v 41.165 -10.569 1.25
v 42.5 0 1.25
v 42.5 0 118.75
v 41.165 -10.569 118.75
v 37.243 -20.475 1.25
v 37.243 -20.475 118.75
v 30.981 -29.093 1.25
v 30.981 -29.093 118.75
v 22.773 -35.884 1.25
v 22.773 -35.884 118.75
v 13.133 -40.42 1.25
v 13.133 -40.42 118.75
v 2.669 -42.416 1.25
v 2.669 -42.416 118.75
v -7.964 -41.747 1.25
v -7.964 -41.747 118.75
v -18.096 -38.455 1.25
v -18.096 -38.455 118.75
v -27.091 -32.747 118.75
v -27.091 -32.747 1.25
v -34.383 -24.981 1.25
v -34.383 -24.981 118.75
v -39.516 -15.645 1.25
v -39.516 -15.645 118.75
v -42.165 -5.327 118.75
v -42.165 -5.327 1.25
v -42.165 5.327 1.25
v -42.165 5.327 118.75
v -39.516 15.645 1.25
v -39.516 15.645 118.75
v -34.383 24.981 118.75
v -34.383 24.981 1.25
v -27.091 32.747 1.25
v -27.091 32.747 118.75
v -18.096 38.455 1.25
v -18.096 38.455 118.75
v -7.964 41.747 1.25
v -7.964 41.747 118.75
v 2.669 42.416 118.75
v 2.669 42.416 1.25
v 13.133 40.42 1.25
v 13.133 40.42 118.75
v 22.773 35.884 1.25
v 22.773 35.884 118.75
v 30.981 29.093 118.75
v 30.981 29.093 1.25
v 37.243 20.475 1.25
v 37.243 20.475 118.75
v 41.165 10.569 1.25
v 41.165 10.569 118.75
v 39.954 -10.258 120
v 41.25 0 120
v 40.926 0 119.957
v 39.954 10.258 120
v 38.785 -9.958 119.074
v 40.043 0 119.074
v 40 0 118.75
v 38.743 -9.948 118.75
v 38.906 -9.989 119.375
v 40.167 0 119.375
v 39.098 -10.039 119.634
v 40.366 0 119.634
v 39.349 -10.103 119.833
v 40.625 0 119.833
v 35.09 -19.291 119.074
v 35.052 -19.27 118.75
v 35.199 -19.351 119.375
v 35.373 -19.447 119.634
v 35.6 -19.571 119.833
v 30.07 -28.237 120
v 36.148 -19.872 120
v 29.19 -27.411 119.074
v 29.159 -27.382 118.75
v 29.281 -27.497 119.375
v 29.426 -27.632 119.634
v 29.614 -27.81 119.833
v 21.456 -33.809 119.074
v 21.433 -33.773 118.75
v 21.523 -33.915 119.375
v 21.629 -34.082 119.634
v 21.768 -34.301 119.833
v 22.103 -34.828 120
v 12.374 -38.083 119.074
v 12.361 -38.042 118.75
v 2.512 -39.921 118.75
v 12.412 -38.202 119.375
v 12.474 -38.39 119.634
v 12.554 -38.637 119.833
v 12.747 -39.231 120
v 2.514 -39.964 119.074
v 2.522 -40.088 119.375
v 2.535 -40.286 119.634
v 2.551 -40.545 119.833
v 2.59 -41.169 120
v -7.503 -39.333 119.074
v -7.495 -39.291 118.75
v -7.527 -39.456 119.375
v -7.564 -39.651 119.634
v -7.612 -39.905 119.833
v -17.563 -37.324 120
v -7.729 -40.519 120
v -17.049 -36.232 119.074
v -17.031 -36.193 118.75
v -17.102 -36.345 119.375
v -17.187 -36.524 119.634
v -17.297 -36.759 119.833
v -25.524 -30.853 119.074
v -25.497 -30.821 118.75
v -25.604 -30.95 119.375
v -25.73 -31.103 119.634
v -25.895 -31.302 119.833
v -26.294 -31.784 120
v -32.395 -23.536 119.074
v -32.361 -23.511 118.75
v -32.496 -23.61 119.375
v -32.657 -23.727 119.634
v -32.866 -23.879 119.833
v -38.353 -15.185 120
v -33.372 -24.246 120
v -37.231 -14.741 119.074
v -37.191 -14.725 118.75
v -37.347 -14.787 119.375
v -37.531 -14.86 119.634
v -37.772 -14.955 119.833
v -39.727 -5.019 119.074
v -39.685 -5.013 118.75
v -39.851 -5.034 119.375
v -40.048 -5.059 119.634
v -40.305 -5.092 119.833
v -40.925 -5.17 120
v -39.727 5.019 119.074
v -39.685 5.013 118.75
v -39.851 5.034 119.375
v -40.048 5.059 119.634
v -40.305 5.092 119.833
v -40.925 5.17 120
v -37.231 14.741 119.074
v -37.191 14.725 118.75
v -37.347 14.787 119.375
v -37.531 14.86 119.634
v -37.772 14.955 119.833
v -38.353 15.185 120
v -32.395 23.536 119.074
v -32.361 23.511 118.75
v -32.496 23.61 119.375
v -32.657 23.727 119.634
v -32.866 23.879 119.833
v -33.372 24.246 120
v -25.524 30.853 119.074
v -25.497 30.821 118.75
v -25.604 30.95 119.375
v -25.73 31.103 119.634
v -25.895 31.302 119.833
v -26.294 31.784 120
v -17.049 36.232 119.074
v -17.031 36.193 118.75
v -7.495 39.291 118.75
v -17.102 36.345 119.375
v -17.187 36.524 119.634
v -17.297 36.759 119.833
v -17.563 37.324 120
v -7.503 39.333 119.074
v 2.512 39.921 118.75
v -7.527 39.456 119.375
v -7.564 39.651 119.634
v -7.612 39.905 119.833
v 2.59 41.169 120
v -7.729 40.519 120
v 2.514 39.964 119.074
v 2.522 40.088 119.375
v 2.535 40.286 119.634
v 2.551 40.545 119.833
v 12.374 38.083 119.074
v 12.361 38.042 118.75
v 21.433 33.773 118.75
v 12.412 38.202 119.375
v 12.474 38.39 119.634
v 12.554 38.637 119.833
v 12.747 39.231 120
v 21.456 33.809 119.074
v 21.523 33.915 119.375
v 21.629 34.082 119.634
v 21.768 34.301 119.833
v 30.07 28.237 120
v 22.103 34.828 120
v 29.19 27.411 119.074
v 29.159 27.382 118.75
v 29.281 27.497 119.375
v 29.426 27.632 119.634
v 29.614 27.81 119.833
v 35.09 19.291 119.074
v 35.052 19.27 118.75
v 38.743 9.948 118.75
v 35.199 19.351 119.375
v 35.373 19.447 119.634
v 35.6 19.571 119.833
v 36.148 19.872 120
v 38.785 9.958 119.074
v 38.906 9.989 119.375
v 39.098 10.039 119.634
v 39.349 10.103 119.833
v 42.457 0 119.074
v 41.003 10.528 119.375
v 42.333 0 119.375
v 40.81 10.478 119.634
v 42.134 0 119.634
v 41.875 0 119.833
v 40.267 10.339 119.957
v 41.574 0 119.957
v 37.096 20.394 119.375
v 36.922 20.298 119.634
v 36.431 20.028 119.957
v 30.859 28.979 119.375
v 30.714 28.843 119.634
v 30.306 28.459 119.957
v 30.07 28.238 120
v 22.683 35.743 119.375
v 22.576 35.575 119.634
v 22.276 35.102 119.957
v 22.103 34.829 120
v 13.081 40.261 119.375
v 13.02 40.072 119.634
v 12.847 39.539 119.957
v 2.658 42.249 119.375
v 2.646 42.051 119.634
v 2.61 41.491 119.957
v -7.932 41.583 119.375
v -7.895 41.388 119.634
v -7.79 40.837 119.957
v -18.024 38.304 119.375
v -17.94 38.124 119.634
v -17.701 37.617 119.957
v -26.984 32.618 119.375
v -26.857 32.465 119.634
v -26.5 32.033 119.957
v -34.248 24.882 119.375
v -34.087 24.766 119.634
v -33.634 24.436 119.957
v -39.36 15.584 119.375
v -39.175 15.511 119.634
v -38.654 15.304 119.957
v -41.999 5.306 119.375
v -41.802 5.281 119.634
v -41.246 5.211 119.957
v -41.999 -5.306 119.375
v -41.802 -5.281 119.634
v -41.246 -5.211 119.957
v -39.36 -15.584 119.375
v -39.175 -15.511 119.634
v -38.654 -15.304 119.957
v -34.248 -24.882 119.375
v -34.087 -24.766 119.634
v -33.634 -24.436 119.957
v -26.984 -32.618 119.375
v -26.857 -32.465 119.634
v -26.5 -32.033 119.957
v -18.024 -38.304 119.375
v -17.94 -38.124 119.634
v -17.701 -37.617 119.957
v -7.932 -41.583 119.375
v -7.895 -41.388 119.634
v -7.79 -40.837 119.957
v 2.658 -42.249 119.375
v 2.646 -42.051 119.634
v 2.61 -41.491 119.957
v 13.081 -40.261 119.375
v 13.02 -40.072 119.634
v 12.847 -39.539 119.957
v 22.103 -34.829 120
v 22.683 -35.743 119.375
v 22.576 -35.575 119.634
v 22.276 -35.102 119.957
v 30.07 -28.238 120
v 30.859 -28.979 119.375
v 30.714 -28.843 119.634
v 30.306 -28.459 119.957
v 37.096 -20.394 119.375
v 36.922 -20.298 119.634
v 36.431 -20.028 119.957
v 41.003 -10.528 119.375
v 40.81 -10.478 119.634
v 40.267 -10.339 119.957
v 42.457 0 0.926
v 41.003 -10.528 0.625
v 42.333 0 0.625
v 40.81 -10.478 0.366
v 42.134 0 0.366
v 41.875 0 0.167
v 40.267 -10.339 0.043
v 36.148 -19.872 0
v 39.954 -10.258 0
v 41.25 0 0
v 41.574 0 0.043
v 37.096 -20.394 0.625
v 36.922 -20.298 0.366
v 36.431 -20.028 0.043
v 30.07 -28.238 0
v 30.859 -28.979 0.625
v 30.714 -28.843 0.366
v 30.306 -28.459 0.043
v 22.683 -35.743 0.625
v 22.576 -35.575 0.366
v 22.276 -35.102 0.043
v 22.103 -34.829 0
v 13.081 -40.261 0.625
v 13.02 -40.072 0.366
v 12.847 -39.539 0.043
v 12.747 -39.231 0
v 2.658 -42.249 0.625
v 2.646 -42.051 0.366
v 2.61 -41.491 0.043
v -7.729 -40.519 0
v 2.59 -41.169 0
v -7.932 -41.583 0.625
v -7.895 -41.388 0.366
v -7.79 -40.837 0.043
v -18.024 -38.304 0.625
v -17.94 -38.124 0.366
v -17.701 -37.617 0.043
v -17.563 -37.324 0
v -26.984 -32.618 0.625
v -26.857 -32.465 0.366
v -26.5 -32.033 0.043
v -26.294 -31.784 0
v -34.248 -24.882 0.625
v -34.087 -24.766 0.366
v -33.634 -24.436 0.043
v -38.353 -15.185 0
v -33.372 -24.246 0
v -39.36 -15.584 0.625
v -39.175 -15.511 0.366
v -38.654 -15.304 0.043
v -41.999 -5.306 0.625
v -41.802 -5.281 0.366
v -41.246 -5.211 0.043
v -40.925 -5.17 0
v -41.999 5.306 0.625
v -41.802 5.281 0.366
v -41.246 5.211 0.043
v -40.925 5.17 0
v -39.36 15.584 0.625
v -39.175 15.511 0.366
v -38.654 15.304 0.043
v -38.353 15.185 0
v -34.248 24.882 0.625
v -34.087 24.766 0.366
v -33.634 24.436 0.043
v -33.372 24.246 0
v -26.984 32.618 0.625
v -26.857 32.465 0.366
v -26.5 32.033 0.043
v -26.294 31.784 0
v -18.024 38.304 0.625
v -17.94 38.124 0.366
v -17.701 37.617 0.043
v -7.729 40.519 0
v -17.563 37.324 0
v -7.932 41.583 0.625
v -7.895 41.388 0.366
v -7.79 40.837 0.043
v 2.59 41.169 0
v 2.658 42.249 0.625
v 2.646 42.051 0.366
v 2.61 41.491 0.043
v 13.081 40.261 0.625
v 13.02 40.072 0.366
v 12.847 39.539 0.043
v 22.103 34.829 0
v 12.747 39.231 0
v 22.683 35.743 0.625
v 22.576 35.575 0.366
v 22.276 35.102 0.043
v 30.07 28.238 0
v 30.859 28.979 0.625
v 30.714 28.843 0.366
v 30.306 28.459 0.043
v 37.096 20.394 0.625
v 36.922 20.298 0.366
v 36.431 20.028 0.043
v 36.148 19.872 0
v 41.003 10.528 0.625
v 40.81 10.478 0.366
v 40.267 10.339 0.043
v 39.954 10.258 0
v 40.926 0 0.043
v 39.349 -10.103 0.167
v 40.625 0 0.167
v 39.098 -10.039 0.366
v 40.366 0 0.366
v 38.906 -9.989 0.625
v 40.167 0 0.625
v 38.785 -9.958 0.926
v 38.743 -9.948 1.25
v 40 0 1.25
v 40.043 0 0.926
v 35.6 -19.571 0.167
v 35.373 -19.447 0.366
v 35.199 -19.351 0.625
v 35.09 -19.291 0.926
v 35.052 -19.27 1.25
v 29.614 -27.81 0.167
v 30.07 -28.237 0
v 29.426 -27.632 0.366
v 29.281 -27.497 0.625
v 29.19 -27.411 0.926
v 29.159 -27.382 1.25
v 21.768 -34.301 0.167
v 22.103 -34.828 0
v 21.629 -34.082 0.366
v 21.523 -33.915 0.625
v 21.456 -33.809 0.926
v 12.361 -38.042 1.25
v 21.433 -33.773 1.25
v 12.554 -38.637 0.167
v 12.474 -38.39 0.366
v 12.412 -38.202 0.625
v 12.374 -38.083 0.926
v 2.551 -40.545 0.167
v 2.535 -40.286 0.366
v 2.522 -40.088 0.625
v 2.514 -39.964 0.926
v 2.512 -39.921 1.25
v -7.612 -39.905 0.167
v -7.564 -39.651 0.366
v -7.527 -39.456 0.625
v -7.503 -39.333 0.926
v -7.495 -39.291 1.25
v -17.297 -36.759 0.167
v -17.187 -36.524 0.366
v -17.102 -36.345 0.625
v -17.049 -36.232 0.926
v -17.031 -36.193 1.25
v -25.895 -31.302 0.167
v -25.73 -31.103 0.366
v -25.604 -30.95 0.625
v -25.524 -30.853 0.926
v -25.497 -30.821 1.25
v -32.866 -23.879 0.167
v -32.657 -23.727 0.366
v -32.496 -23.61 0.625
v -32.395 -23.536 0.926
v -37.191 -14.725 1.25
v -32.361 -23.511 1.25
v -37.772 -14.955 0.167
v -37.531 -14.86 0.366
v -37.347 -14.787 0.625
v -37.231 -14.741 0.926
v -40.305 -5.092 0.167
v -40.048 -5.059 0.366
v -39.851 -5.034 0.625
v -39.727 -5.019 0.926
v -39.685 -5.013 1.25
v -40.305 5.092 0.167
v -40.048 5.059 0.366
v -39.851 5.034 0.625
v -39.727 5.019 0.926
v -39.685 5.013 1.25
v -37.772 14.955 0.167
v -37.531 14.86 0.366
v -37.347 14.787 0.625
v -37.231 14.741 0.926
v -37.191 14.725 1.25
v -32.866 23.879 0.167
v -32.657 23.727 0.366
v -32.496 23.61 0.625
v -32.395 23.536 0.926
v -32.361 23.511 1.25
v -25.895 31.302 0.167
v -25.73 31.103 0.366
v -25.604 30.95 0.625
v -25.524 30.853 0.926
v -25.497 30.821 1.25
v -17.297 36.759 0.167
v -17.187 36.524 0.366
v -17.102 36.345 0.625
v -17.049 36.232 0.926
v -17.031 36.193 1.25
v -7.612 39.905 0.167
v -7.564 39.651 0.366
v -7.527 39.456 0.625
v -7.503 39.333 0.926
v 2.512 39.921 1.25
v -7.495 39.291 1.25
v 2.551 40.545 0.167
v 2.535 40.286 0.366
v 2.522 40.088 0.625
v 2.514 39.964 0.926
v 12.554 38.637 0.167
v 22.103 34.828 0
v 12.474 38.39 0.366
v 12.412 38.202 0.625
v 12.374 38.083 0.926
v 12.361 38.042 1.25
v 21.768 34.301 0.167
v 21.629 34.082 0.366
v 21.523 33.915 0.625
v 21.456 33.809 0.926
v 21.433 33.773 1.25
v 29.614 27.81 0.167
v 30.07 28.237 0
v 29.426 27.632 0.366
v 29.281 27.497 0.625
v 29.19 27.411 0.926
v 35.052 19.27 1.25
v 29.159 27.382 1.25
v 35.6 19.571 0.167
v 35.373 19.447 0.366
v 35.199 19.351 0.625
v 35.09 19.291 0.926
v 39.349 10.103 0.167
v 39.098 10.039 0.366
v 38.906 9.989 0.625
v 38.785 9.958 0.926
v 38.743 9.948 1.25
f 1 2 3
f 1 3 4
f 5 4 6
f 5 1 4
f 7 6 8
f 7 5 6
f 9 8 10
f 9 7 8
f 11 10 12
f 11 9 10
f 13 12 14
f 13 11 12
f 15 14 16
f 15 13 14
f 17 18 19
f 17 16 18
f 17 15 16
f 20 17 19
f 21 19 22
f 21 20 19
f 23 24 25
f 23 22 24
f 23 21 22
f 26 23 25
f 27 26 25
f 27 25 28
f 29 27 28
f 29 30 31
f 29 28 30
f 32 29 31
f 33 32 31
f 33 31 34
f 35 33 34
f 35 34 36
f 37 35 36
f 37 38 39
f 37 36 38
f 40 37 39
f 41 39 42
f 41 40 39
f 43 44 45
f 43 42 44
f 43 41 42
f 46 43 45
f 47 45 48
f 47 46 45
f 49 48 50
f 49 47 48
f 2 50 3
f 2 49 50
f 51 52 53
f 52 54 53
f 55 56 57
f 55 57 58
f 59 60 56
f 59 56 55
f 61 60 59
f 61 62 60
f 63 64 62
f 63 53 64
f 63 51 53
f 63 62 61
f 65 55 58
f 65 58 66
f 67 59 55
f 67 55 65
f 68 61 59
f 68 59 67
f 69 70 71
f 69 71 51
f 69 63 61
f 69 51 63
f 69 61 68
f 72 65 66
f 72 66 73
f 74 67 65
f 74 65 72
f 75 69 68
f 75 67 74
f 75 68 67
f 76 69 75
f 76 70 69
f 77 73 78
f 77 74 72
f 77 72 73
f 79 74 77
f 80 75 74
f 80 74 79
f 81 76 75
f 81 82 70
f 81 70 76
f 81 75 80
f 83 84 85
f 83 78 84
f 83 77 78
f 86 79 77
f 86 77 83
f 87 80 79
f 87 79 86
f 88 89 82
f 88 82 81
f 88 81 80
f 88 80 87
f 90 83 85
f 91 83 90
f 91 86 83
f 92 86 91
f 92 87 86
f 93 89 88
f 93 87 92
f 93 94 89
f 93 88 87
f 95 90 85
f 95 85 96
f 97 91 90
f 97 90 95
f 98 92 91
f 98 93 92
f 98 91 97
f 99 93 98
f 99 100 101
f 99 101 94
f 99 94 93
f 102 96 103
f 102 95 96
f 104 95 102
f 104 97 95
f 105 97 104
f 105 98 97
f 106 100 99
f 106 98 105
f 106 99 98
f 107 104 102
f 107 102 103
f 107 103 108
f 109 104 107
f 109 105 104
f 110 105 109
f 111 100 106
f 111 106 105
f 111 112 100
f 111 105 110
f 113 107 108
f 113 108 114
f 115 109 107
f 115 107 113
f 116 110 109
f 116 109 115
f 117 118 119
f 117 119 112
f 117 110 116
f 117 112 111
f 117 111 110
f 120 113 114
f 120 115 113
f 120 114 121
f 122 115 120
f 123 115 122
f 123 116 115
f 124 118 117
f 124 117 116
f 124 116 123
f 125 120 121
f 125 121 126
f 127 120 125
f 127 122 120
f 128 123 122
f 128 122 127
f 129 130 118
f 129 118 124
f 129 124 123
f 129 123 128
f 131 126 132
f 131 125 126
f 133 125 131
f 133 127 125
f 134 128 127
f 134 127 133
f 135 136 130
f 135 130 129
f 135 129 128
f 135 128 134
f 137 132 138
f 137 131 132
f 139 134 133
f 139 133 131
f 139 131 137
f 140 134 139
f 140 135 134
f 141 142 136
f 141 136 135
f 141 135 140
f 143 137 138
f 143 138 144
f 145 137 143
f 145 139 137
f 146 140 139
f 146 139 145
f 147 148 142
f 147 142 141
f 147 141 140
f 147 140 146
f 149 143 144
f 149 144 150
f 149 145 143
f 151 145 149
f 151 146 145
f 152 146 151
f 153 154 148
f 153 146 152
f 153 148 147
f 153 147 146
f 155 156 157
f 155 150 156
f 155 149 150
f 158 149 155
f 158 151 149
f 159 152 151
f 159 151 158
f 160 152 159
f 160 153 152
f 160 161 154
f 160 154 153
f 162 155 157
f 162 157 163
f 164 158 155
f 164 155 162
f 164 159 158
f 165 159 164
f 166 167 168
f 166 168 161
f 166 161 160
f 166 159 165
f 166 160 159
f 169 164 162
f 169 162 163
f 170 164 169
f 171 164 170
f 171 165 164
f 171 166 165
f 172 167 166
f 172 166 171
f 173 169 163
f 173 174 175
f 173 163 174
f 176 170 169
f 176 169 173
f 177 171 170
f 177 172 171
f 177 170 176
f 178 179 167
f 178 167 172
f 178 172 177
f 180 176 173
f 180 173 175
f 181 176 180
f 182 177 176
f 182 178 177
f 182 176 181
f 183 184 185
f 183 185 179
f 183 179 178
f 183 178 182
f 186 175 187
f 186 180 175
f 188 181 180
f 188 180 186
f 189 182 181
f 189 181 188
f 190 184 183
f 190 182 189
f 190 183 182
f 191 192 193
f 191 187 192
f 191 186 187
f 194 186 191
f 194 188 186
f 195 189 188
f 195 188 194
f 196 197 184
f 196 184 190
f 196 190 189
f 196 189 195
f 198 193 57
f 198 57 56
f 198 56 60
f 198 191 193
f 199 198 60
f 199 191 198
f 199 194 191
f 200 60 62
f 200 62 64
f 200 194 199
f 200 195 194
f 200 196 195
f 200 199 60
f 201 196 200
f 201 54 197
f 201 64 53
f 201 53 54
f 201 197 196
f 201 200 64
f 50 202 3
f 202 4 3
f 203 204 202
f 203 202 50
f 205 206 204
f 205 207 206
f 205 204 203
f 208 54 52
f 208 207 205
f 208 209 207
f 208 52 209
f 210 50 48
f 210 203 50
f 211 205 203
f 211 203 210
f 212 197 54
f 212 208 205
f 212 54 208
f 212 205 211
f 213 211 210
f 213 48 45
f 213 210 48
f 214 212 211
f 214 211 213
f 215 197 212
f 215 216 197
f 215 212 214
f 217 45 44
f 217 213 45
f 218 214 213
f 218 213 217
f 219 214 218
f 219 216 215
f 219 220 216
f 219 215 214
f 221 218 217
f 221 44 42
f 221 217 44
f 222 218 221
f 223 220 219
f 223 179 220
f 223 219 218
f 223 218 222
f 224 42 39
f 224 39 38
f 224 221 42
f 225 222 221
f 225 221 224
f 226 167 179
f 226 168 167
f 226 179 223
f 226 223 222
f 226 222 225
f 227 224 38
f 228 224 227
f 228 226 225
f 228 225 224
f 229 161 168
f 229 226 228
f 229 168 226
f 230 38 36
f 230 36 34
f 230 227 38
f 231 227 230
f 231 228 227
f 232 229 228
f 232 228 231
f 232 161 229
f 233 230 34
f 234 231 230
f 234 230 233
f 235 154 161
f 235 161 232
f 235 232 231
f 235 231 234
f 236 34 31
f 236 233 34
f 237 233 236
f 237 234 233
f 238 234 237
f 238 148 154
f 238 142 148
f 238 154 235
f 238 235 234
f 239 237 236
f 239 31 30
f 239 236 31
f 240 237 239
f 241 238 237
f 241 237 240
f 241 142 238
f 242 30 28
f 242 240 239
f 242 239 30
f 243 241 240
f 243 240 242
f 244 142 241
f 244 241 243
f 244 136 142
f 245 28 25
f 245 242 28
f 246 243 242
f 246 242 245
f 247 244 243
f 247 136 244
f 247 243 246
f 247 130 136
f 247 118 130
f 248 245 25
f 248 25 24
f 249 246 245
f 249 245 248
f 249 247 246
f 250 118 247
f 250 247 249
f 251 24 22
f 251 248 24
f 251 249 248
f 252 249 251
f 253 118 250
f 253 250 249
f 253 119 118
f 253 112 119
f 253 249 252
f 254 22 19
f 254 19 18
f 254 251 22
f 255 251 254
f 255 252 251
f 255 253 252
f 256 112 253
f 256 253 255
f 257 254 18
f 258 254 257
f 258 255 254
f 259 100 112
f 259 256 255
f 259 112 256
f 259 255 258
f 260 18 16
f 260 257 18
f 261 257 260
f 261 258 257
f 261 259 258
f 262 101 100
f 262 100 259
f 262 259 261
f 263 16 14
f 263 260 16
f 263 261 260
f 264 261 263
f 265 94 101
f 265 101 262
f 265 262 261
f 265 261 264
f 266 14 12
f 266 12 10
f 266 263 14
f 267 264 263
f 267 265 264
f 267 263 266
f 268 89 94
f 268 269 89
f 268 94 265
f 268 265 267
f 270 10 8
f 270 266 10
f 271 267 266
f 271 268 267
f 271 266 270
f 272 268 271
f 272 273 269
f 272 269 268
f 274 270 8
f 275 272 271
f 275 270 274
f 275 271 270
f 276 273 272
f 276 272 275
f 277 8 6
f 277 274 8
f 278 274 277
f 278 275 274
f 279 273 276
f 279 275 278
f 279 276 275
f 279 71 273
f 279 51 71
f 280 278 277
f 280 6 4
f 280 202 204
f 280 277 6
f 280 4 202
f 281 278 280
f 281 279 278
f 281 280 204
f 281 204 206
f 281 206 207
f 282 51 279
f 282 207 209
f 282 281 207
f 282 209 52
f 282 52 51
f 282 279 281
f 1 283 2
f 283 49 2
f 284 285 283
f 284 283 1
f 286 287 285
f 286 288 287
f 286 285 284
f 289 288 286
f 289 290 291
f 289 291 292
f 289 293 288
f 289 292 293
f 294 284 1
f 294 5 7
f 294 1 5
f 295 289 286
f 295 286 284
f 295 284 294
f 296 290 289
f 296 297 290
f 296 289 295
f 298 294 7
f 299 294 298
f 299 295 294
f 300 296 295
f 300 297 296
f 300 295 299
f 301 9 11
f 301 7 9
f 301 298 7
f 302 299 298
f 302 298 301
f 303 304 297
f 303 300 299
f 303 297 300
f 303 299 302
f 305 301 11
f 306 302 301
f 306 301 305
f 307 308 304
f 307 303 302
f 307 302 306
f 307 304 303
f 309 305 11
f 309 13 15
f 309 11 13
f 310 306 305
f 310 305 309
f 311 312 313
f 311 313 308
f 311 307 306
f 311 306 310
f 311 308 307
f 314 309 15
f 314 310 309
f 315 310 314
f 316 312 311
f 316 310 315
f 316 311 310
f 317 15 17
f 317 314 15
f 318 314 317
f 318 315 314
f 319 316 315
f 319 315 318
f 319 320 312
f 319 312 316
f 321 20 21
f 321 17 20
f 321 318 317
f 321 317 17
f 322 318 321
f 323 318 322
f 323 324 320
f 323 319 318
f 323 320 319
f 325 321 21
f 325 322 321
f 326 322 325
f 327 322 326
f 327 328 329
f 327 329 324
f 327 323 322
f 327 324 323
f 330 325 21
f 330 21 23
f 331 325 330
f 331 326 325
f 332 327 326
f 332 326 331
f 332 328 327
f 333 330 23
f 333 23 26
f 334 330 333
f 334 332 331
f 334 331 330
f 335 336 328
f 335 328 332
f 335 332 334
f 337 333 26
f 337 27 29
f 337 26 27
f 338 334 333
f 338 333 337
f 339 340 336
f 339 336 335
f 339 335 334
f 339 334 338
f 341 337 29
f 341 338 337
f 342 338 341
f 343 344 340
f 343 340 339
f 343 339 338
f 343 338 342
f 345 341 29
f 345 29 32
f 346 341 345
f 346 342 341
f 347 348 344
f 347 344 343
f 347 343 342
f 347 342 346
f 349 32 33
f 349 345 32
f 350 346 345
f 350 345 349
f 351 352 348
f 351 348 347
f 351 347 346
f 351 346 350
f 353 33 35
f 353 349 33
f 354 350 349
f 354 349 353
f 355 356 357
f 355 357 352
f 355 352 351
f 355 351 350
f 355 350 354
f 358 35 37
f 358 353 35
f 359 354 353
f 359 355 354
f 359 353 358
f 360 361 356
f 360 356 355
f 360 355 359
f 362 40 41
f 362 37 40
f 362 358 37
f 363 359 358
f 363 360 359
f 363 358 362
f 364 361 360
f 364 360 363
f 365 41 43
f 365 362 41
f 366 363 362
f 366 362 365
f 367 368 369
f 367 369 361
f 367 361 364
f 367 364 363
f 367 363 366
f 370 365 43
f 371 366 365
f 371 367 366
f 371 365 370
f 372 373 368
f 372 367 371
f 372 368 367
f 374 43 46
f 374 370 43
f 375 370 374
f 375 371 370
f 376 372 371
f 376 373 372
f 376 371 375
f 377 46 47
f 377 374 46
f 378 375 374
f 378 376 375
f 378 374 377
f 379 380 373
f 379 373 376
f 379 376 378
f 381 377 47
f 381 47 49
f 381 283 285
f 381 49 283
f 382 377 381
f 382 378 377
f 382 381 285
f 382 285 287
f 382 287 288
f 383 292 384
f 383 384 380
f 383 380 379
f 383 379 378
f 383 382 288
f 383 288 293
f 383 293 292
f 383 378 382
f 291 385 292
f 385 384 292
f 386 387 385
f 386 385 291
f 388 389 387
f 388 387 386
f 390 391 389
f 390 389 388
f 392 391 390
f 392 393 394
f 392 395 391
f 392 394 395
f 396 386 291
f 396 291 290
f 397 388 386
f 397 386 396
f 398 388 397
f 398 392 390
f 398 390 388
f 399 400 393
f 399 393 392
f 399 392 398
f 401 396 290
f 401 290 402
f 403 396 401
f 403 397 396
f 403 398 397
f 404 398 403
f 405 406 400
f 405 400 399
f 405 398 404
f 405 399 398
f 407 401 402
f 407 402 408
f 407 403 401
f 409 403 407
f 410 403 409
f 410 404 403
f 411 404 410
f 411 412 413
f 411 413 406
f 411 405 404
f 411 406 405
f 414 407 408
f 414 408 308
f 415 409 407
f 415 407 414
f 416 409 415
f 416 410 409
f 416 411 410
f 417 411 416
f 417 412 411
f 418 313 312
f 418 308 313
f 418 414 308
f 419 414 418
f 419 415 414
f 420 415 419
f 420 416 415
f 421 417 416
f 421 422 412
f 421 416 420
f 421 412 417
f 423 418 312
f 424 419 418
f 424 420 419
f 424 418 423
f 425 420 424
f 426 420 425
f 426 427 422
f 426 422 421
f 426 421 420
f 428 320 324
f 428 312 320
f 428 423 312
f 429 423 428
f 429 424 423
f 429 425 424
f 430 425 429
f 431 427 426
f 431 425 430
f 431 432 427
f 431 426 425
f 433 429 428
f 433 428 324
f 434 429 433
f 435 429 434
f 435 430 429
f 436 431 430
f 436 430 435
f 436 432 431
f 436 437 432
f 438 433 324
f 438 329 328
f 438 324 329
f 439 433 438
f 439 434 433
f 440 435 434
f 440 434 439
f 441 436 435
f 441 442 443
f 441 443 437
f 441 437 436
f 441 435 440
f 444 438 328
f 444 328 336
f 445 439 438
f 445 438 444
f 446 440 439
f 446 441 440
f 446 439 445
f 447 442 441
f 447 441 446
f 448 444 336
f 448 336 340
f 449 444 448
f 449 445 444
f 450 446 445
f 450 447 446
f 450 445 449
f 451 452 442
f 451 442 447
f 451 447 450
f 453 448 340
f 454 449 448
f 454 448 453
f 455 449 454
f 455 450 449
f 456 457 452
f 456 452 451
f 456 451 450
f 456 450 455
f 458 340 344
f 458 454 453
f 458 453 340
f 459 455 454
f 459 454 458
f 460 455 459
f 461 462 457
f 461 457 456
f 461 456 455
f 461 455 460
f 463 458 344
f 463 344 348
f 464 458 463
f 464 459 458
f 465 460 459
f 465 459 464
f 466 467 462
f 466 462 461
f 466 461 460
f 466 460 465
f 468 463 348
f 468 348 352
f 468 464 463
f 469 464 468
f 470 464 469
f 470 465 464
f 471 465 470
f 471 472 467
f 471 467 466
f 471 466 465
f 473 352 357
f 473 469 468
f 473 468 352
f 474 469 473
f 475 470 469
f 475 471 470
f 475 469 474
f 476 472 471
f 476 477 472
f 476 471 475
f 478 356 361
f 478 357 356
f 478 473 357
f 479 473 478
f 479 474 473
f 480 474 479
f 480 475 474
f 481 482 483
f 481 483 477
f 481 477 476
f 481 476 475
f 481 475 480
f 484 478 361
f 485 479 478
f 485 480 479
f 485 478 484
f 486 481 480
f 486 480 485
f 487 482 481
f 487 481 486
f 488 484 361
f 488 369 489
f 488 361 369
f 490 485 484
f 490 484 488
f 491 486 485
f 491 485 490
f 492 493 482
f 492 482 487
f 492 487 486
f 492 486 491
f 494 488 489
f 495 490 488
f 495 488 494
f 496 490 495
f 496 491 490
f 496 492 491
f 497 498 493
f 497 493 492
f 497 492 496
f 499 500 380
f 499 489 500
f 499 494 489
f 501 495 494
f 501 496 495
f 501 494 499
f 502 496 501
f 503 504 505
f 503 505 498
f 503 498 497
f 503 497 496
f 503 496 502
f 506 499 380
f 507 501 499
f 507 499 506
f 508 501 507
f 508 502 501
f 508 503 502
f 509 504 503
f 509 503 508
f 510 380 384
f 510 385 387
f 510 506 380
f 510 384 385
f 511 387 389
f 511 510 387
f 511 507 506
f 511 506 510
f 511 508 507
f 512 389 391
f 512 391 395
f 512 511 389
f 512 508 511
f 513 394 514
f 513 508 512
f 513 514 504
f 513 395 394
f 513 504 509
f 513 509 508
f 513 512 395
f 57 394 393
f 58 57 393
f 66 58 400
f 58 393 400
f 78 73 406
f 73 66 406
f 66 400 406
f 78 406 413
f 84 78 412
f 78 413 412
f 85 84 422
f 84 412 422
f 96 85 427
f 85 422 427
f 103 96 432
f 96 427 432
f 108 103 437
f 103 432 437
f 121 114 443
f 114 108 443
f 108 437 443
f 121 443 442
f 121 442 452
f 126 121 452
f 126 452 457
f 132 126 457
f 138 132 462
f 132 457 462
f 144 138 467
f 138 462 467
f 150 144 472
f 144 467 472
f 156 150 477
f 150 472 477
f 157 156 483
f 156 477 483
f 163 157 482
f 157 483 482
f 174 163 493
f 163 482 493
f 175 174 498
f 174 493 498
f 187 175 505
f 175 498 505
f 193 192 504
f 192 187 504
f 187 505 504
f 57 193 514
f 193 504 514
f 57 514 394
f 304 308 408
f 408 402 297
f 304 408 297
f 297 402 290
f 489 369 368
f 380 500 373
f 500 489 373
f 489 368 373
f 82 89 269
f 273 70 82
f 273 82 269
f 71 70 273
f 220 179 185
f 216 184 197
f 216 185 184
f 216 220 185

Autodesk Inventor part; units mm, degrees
ref_plane "YZ Plane" through (0, 0, 0) normal (1, 0, 0) x (0, 1, 0)
ref_plane "XZ Plane" through (0, 0, 0) normal (0, 1, 0) x (-1, 0, 0)
ref_plane "XY Plane" through (0, 0, 0) normal (0, 0, 1) x (1, 0, 0)
sketch "Sketch1" plane through (0, 0, 0) normal (0, 0, 1) x (1, 0, 0)
  circle A0 centre (0, 0) radius 42.5
  circle A1 centre (0, 0) radius 40
  dimension "d0" = 85
  dimension "d1" = 80
extrude "Extrusion1" add sketch "Sketch1" along normal blind 120
fillet "Fillet1" radius 1.25 1 edges at (-42.5, 0, 120)
fillet "Fillet2" radius 1.25 1 edges at (-42.5, 0, 0)
fillet "Fillet3" radius 1.25 1 edges at (-40, 0, 0)
fillet "Fillet4" radius 1.25 1 edges at (-40, 0, 120)
equation "\"d0\" = OuterDiameter"
equation "\"d1\" = InnerDiameter"
equation "\"d2\" = height"
equation "\"d4\" = fillet"
equation "\"d5\" = fillet"
equation "\"d6\" = fillet"
equation "\"d7\" = fillet"
equation "\"OuterDiameter\" = InnerDiameter + thickness"
equation "\"InnerDiameter\" = 80"
equation "\"thickness\" = 5"
equation "\"height\" = 120"
equation "\"fillet\" = 0.25 * thickness"
